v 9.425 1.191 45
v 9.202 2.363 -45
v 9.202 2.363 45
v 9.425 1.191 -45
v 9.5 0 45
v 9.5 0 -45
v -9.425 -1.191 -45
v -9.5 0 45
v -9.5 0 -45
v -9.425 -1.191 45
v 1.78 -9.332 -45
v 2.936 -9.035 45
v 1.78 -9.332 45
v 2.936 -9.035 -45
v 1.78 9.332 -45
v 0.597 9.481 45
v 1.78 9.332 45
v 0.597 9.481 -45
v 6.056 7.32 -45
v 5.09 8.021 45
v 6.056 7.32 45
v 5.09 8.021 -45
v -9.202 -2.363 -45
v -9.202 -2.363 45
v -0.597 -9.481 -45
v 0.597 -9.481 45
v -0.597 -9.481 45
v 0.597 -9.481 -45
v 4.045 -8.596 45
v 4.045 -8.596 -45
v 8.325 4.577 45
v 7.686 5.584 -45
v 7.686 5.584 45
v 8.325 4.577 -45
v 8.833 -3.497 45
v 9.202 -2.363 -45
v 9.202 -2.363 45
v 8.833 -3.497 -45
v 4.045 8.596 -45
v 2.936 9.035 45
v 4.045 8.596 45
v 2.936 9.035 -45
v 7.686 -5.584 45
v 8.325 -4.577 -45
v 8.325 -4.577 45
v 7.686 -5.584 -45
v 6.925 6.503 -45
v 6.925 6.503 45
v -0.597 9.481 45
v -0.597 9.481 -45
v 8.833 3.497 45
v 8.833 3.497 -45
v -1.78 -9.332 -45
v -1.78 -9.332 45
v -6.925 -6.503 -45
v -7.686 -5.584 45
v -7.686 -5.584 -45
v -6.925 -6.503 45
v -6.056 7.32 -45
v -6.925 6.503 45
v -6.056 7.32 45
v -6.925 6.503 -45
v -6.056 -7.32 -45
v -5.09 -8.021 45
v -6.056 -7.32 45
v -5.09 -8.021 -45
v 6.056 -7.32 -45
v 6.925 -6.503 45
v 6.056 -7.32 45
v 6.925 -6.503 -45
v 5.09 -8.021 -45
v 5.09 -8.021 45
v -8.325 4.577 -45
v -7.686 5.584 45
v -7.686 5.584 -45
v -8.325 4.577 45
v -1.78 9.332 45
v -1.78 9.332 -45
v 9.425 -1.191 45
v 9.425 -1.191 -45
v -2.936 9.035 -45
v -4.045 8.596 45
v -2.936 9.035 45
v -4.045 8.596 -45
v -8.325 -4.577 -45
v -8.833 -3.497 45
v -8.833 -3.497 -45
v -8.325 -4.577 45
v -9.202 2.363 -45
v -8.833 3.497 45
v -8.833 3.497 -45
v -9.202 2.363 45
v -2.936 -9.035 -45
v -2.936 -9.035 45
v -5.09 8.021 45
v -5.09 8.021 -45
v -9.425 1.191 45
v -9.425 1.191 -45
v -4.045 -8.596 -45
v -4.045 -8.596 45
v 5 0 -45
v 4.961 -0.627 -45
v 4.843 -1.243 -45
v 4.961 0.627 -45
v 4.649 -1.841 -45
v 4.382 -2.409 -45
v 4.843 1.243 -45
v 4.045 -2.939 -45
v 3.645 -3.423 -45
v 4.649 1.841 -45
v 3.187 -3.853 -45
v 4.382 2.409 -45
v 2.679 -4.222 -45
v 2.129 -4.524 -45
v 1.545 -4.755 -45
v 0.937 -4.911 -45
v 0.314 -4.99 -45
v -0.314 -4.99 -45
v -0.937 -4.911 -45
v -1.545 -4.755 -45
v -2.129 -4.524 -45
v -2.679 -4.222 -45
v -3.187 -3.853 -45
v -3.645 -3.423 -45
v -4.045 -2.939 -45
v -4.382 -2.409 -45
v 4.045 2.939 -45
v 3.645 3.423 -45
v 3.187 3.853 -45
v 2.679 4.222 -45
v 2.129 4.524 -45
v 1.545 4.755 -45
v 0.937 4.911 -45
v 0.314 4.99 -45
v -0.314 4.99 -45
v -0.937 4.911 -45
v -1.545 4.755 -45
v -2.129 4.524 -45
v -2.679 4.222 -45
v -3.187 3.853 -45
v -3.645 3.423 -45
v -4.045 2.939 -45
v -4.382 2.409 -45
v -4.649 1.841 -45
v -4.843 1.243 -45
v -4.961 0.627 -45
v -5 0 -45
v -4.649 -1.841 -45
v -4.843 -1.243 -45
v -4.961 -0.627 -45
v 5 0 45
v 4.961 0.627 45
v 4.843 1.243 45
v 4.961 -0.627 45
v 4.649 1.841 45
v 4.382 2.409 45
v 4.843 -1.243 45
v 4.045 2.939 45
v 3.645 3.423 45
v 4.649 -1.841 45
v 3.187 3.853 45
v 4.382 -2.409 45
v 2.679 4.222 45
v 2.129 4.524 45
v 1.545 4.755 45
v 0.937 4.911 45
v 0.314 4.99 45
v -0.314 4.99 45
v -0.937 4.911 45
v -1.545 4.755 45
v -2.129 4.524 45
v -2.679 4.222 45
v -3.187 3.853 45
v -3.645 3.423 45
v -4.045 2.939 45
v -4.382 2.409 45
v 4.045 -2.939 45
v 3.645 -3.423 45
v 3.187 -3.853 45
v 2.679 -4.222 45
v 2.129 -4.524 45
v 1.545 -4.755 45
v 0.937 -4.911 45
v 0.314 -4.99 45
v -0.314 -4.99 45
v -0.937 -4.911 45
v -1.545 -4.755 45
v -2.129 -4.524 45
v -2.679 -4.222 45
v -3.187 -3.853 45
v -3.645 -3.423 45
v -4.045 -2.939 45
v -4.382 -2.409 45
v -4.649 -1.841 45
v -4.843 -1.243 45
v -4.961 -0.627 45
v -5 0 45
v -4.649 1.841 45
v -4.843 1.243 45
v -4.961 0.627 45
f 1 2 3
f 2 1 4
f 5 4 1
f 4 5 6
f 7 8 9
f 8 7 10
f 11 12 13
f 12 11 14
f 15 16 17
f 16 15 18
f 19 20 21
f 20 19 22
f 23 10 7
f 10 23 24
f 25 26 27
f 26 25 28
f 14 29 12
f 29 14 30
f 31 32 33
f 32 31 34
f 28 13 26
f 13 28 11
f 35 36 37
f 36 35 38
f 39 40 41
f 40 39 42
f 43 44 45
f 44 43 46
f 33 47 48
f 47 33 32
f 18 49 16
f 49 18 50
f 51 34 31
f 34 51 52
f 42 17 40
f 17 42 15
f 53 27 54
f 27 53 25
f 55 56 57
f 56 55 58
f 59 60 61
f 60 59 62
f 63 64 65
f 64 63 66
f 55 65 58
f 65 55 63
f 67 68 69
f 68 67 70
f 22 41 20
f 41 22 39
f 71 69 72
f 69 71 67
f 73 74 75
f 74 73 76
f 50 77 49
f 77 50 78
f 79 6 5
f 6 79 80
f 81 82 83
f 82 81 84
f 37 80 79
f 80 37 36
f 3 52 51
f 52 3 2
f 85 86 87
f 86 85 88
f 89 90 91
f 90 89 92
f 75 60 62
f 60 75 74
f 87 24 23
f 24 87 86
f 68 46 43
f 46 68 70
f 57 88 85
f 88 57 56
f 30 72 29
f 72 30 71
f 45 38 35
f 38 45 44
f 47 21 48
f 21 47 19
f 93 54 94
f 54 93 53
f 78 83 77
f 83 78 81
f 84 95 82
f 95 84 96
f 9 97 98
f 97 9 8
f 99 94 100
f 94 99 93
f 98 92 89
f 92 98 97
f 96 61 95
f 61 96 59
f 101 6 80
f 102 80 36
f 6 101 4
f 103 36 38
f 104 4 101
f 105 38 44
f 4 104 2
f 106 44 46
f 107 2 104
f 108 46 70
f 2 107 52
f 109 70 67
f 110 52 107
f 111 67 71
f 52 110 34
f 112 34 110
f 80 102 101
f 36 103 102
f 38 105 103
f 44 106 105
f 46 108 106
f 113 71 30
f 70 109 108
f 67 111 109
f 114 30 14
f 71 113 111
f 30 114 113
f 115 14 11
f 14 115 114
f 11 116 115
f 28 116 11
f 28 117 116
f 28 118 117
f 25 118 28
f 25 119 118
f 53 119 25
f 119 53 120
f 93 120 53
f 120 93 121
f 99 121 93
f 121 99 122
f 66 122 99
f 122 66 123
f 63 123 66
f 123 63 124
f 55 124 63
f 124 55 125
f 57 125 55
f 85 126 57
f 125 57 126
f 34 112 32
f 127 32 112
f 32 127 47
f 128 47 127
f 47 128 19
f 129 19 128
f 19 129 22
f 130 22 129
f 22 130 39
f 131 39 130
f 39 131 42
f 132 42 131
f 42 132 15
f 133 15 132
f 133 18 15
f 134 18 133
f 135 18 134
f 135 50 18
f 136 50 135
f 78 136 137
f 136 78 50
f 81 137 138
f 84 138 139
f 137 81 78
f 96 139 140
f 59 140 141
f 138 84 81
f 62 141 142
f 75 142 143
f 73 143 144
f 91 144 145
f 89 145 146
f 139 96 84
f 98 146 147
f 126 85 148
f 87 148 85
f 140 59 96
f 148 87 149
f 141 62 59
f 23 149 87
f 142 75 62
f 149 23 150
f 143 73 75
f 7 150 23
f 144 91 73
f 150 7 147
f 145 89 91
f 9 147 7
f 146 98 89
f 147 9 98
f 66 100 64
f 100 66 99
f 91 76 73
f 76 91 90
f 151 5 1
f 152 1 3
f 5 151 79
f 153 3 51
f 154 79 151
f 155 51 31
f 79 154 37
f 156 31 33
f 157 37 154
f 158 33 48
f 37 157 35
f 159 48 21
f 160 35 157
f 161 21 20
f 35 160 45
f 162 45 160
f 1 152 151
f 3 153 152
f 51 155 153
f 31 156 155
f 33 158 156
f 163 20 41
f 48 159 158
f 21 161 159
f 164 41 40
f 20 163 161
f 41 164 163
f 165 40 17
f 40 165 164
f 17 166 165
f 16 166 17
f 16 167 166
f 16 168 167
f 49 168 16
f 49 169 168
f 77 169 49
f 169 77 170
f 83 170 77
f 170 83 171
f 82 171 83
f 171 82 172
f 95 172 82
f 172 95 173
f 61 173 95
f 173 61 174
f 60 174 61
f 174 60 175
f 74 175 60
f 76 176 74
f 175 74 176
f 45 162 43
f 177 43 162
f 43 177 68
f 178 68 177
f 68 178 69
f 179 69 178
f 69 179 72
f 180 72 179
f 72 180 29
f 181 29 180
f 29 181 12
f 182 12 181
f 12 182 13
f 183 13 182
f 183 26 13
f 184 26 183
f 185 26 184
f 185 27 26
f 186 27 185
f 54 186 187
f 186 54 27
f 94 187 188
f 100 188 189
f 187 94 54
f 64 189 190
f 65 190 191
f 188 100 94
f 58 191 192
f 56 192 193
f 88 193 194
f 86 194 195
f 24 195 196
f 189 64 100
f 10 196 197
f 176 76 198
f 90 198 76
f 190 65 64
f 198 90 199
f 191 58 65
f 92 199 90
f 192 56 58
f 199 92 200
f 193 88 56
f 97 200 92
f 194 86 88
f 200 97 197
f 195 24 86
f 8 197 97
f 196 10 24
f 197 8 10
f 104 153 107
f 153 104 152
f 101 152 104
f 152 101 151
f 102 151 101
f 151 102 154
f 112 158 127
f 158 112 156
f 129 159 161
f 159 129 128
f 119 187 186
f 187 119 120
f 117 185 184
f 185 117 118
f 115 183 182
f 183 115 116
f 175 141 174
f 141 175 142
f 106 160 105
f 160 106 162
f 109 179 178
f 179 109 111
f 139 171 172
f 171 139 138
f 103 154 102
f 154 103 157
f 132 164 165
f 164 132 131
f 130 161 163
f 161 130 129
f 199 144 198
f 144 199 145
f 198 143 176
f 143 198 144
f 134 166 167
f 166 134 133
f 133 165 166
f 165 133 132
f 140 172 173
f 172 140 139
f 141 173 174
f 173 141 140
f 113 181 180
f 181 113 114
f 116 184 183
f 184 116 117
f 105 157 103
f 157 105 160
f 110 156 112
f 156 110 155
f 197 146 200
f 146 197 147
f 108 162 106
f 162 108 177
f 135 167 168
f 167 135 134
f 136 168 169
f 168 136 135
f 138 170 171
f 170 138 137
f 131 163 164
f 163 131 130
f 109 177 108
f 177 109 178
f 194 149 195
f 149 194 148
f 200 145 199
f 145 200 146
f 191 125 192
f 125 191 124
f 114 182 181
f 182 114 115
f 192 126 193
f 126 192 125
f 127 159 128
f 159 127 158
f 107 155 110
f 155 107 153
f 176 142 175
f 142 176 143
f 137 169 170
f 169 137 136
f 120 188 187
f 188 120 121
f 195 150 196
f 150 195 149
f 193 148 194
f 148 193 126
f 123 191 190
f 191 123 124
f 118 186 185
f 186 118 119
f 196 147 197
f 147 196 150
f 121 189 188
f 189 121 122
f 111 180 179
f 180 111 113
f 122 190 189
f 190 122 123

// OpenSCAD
$fn = 50;


difference() {
	union() {
		translate(v = [0, 0, -45.0000000000]) {
			cylinder(h = 90, r = 9.5000000000);
		}
	}
	union() {
		translate(v = [0, 0, -100.0000000000]) {
			cylinder(h = 200, r = 5.0000000000);
		}
	}
}
